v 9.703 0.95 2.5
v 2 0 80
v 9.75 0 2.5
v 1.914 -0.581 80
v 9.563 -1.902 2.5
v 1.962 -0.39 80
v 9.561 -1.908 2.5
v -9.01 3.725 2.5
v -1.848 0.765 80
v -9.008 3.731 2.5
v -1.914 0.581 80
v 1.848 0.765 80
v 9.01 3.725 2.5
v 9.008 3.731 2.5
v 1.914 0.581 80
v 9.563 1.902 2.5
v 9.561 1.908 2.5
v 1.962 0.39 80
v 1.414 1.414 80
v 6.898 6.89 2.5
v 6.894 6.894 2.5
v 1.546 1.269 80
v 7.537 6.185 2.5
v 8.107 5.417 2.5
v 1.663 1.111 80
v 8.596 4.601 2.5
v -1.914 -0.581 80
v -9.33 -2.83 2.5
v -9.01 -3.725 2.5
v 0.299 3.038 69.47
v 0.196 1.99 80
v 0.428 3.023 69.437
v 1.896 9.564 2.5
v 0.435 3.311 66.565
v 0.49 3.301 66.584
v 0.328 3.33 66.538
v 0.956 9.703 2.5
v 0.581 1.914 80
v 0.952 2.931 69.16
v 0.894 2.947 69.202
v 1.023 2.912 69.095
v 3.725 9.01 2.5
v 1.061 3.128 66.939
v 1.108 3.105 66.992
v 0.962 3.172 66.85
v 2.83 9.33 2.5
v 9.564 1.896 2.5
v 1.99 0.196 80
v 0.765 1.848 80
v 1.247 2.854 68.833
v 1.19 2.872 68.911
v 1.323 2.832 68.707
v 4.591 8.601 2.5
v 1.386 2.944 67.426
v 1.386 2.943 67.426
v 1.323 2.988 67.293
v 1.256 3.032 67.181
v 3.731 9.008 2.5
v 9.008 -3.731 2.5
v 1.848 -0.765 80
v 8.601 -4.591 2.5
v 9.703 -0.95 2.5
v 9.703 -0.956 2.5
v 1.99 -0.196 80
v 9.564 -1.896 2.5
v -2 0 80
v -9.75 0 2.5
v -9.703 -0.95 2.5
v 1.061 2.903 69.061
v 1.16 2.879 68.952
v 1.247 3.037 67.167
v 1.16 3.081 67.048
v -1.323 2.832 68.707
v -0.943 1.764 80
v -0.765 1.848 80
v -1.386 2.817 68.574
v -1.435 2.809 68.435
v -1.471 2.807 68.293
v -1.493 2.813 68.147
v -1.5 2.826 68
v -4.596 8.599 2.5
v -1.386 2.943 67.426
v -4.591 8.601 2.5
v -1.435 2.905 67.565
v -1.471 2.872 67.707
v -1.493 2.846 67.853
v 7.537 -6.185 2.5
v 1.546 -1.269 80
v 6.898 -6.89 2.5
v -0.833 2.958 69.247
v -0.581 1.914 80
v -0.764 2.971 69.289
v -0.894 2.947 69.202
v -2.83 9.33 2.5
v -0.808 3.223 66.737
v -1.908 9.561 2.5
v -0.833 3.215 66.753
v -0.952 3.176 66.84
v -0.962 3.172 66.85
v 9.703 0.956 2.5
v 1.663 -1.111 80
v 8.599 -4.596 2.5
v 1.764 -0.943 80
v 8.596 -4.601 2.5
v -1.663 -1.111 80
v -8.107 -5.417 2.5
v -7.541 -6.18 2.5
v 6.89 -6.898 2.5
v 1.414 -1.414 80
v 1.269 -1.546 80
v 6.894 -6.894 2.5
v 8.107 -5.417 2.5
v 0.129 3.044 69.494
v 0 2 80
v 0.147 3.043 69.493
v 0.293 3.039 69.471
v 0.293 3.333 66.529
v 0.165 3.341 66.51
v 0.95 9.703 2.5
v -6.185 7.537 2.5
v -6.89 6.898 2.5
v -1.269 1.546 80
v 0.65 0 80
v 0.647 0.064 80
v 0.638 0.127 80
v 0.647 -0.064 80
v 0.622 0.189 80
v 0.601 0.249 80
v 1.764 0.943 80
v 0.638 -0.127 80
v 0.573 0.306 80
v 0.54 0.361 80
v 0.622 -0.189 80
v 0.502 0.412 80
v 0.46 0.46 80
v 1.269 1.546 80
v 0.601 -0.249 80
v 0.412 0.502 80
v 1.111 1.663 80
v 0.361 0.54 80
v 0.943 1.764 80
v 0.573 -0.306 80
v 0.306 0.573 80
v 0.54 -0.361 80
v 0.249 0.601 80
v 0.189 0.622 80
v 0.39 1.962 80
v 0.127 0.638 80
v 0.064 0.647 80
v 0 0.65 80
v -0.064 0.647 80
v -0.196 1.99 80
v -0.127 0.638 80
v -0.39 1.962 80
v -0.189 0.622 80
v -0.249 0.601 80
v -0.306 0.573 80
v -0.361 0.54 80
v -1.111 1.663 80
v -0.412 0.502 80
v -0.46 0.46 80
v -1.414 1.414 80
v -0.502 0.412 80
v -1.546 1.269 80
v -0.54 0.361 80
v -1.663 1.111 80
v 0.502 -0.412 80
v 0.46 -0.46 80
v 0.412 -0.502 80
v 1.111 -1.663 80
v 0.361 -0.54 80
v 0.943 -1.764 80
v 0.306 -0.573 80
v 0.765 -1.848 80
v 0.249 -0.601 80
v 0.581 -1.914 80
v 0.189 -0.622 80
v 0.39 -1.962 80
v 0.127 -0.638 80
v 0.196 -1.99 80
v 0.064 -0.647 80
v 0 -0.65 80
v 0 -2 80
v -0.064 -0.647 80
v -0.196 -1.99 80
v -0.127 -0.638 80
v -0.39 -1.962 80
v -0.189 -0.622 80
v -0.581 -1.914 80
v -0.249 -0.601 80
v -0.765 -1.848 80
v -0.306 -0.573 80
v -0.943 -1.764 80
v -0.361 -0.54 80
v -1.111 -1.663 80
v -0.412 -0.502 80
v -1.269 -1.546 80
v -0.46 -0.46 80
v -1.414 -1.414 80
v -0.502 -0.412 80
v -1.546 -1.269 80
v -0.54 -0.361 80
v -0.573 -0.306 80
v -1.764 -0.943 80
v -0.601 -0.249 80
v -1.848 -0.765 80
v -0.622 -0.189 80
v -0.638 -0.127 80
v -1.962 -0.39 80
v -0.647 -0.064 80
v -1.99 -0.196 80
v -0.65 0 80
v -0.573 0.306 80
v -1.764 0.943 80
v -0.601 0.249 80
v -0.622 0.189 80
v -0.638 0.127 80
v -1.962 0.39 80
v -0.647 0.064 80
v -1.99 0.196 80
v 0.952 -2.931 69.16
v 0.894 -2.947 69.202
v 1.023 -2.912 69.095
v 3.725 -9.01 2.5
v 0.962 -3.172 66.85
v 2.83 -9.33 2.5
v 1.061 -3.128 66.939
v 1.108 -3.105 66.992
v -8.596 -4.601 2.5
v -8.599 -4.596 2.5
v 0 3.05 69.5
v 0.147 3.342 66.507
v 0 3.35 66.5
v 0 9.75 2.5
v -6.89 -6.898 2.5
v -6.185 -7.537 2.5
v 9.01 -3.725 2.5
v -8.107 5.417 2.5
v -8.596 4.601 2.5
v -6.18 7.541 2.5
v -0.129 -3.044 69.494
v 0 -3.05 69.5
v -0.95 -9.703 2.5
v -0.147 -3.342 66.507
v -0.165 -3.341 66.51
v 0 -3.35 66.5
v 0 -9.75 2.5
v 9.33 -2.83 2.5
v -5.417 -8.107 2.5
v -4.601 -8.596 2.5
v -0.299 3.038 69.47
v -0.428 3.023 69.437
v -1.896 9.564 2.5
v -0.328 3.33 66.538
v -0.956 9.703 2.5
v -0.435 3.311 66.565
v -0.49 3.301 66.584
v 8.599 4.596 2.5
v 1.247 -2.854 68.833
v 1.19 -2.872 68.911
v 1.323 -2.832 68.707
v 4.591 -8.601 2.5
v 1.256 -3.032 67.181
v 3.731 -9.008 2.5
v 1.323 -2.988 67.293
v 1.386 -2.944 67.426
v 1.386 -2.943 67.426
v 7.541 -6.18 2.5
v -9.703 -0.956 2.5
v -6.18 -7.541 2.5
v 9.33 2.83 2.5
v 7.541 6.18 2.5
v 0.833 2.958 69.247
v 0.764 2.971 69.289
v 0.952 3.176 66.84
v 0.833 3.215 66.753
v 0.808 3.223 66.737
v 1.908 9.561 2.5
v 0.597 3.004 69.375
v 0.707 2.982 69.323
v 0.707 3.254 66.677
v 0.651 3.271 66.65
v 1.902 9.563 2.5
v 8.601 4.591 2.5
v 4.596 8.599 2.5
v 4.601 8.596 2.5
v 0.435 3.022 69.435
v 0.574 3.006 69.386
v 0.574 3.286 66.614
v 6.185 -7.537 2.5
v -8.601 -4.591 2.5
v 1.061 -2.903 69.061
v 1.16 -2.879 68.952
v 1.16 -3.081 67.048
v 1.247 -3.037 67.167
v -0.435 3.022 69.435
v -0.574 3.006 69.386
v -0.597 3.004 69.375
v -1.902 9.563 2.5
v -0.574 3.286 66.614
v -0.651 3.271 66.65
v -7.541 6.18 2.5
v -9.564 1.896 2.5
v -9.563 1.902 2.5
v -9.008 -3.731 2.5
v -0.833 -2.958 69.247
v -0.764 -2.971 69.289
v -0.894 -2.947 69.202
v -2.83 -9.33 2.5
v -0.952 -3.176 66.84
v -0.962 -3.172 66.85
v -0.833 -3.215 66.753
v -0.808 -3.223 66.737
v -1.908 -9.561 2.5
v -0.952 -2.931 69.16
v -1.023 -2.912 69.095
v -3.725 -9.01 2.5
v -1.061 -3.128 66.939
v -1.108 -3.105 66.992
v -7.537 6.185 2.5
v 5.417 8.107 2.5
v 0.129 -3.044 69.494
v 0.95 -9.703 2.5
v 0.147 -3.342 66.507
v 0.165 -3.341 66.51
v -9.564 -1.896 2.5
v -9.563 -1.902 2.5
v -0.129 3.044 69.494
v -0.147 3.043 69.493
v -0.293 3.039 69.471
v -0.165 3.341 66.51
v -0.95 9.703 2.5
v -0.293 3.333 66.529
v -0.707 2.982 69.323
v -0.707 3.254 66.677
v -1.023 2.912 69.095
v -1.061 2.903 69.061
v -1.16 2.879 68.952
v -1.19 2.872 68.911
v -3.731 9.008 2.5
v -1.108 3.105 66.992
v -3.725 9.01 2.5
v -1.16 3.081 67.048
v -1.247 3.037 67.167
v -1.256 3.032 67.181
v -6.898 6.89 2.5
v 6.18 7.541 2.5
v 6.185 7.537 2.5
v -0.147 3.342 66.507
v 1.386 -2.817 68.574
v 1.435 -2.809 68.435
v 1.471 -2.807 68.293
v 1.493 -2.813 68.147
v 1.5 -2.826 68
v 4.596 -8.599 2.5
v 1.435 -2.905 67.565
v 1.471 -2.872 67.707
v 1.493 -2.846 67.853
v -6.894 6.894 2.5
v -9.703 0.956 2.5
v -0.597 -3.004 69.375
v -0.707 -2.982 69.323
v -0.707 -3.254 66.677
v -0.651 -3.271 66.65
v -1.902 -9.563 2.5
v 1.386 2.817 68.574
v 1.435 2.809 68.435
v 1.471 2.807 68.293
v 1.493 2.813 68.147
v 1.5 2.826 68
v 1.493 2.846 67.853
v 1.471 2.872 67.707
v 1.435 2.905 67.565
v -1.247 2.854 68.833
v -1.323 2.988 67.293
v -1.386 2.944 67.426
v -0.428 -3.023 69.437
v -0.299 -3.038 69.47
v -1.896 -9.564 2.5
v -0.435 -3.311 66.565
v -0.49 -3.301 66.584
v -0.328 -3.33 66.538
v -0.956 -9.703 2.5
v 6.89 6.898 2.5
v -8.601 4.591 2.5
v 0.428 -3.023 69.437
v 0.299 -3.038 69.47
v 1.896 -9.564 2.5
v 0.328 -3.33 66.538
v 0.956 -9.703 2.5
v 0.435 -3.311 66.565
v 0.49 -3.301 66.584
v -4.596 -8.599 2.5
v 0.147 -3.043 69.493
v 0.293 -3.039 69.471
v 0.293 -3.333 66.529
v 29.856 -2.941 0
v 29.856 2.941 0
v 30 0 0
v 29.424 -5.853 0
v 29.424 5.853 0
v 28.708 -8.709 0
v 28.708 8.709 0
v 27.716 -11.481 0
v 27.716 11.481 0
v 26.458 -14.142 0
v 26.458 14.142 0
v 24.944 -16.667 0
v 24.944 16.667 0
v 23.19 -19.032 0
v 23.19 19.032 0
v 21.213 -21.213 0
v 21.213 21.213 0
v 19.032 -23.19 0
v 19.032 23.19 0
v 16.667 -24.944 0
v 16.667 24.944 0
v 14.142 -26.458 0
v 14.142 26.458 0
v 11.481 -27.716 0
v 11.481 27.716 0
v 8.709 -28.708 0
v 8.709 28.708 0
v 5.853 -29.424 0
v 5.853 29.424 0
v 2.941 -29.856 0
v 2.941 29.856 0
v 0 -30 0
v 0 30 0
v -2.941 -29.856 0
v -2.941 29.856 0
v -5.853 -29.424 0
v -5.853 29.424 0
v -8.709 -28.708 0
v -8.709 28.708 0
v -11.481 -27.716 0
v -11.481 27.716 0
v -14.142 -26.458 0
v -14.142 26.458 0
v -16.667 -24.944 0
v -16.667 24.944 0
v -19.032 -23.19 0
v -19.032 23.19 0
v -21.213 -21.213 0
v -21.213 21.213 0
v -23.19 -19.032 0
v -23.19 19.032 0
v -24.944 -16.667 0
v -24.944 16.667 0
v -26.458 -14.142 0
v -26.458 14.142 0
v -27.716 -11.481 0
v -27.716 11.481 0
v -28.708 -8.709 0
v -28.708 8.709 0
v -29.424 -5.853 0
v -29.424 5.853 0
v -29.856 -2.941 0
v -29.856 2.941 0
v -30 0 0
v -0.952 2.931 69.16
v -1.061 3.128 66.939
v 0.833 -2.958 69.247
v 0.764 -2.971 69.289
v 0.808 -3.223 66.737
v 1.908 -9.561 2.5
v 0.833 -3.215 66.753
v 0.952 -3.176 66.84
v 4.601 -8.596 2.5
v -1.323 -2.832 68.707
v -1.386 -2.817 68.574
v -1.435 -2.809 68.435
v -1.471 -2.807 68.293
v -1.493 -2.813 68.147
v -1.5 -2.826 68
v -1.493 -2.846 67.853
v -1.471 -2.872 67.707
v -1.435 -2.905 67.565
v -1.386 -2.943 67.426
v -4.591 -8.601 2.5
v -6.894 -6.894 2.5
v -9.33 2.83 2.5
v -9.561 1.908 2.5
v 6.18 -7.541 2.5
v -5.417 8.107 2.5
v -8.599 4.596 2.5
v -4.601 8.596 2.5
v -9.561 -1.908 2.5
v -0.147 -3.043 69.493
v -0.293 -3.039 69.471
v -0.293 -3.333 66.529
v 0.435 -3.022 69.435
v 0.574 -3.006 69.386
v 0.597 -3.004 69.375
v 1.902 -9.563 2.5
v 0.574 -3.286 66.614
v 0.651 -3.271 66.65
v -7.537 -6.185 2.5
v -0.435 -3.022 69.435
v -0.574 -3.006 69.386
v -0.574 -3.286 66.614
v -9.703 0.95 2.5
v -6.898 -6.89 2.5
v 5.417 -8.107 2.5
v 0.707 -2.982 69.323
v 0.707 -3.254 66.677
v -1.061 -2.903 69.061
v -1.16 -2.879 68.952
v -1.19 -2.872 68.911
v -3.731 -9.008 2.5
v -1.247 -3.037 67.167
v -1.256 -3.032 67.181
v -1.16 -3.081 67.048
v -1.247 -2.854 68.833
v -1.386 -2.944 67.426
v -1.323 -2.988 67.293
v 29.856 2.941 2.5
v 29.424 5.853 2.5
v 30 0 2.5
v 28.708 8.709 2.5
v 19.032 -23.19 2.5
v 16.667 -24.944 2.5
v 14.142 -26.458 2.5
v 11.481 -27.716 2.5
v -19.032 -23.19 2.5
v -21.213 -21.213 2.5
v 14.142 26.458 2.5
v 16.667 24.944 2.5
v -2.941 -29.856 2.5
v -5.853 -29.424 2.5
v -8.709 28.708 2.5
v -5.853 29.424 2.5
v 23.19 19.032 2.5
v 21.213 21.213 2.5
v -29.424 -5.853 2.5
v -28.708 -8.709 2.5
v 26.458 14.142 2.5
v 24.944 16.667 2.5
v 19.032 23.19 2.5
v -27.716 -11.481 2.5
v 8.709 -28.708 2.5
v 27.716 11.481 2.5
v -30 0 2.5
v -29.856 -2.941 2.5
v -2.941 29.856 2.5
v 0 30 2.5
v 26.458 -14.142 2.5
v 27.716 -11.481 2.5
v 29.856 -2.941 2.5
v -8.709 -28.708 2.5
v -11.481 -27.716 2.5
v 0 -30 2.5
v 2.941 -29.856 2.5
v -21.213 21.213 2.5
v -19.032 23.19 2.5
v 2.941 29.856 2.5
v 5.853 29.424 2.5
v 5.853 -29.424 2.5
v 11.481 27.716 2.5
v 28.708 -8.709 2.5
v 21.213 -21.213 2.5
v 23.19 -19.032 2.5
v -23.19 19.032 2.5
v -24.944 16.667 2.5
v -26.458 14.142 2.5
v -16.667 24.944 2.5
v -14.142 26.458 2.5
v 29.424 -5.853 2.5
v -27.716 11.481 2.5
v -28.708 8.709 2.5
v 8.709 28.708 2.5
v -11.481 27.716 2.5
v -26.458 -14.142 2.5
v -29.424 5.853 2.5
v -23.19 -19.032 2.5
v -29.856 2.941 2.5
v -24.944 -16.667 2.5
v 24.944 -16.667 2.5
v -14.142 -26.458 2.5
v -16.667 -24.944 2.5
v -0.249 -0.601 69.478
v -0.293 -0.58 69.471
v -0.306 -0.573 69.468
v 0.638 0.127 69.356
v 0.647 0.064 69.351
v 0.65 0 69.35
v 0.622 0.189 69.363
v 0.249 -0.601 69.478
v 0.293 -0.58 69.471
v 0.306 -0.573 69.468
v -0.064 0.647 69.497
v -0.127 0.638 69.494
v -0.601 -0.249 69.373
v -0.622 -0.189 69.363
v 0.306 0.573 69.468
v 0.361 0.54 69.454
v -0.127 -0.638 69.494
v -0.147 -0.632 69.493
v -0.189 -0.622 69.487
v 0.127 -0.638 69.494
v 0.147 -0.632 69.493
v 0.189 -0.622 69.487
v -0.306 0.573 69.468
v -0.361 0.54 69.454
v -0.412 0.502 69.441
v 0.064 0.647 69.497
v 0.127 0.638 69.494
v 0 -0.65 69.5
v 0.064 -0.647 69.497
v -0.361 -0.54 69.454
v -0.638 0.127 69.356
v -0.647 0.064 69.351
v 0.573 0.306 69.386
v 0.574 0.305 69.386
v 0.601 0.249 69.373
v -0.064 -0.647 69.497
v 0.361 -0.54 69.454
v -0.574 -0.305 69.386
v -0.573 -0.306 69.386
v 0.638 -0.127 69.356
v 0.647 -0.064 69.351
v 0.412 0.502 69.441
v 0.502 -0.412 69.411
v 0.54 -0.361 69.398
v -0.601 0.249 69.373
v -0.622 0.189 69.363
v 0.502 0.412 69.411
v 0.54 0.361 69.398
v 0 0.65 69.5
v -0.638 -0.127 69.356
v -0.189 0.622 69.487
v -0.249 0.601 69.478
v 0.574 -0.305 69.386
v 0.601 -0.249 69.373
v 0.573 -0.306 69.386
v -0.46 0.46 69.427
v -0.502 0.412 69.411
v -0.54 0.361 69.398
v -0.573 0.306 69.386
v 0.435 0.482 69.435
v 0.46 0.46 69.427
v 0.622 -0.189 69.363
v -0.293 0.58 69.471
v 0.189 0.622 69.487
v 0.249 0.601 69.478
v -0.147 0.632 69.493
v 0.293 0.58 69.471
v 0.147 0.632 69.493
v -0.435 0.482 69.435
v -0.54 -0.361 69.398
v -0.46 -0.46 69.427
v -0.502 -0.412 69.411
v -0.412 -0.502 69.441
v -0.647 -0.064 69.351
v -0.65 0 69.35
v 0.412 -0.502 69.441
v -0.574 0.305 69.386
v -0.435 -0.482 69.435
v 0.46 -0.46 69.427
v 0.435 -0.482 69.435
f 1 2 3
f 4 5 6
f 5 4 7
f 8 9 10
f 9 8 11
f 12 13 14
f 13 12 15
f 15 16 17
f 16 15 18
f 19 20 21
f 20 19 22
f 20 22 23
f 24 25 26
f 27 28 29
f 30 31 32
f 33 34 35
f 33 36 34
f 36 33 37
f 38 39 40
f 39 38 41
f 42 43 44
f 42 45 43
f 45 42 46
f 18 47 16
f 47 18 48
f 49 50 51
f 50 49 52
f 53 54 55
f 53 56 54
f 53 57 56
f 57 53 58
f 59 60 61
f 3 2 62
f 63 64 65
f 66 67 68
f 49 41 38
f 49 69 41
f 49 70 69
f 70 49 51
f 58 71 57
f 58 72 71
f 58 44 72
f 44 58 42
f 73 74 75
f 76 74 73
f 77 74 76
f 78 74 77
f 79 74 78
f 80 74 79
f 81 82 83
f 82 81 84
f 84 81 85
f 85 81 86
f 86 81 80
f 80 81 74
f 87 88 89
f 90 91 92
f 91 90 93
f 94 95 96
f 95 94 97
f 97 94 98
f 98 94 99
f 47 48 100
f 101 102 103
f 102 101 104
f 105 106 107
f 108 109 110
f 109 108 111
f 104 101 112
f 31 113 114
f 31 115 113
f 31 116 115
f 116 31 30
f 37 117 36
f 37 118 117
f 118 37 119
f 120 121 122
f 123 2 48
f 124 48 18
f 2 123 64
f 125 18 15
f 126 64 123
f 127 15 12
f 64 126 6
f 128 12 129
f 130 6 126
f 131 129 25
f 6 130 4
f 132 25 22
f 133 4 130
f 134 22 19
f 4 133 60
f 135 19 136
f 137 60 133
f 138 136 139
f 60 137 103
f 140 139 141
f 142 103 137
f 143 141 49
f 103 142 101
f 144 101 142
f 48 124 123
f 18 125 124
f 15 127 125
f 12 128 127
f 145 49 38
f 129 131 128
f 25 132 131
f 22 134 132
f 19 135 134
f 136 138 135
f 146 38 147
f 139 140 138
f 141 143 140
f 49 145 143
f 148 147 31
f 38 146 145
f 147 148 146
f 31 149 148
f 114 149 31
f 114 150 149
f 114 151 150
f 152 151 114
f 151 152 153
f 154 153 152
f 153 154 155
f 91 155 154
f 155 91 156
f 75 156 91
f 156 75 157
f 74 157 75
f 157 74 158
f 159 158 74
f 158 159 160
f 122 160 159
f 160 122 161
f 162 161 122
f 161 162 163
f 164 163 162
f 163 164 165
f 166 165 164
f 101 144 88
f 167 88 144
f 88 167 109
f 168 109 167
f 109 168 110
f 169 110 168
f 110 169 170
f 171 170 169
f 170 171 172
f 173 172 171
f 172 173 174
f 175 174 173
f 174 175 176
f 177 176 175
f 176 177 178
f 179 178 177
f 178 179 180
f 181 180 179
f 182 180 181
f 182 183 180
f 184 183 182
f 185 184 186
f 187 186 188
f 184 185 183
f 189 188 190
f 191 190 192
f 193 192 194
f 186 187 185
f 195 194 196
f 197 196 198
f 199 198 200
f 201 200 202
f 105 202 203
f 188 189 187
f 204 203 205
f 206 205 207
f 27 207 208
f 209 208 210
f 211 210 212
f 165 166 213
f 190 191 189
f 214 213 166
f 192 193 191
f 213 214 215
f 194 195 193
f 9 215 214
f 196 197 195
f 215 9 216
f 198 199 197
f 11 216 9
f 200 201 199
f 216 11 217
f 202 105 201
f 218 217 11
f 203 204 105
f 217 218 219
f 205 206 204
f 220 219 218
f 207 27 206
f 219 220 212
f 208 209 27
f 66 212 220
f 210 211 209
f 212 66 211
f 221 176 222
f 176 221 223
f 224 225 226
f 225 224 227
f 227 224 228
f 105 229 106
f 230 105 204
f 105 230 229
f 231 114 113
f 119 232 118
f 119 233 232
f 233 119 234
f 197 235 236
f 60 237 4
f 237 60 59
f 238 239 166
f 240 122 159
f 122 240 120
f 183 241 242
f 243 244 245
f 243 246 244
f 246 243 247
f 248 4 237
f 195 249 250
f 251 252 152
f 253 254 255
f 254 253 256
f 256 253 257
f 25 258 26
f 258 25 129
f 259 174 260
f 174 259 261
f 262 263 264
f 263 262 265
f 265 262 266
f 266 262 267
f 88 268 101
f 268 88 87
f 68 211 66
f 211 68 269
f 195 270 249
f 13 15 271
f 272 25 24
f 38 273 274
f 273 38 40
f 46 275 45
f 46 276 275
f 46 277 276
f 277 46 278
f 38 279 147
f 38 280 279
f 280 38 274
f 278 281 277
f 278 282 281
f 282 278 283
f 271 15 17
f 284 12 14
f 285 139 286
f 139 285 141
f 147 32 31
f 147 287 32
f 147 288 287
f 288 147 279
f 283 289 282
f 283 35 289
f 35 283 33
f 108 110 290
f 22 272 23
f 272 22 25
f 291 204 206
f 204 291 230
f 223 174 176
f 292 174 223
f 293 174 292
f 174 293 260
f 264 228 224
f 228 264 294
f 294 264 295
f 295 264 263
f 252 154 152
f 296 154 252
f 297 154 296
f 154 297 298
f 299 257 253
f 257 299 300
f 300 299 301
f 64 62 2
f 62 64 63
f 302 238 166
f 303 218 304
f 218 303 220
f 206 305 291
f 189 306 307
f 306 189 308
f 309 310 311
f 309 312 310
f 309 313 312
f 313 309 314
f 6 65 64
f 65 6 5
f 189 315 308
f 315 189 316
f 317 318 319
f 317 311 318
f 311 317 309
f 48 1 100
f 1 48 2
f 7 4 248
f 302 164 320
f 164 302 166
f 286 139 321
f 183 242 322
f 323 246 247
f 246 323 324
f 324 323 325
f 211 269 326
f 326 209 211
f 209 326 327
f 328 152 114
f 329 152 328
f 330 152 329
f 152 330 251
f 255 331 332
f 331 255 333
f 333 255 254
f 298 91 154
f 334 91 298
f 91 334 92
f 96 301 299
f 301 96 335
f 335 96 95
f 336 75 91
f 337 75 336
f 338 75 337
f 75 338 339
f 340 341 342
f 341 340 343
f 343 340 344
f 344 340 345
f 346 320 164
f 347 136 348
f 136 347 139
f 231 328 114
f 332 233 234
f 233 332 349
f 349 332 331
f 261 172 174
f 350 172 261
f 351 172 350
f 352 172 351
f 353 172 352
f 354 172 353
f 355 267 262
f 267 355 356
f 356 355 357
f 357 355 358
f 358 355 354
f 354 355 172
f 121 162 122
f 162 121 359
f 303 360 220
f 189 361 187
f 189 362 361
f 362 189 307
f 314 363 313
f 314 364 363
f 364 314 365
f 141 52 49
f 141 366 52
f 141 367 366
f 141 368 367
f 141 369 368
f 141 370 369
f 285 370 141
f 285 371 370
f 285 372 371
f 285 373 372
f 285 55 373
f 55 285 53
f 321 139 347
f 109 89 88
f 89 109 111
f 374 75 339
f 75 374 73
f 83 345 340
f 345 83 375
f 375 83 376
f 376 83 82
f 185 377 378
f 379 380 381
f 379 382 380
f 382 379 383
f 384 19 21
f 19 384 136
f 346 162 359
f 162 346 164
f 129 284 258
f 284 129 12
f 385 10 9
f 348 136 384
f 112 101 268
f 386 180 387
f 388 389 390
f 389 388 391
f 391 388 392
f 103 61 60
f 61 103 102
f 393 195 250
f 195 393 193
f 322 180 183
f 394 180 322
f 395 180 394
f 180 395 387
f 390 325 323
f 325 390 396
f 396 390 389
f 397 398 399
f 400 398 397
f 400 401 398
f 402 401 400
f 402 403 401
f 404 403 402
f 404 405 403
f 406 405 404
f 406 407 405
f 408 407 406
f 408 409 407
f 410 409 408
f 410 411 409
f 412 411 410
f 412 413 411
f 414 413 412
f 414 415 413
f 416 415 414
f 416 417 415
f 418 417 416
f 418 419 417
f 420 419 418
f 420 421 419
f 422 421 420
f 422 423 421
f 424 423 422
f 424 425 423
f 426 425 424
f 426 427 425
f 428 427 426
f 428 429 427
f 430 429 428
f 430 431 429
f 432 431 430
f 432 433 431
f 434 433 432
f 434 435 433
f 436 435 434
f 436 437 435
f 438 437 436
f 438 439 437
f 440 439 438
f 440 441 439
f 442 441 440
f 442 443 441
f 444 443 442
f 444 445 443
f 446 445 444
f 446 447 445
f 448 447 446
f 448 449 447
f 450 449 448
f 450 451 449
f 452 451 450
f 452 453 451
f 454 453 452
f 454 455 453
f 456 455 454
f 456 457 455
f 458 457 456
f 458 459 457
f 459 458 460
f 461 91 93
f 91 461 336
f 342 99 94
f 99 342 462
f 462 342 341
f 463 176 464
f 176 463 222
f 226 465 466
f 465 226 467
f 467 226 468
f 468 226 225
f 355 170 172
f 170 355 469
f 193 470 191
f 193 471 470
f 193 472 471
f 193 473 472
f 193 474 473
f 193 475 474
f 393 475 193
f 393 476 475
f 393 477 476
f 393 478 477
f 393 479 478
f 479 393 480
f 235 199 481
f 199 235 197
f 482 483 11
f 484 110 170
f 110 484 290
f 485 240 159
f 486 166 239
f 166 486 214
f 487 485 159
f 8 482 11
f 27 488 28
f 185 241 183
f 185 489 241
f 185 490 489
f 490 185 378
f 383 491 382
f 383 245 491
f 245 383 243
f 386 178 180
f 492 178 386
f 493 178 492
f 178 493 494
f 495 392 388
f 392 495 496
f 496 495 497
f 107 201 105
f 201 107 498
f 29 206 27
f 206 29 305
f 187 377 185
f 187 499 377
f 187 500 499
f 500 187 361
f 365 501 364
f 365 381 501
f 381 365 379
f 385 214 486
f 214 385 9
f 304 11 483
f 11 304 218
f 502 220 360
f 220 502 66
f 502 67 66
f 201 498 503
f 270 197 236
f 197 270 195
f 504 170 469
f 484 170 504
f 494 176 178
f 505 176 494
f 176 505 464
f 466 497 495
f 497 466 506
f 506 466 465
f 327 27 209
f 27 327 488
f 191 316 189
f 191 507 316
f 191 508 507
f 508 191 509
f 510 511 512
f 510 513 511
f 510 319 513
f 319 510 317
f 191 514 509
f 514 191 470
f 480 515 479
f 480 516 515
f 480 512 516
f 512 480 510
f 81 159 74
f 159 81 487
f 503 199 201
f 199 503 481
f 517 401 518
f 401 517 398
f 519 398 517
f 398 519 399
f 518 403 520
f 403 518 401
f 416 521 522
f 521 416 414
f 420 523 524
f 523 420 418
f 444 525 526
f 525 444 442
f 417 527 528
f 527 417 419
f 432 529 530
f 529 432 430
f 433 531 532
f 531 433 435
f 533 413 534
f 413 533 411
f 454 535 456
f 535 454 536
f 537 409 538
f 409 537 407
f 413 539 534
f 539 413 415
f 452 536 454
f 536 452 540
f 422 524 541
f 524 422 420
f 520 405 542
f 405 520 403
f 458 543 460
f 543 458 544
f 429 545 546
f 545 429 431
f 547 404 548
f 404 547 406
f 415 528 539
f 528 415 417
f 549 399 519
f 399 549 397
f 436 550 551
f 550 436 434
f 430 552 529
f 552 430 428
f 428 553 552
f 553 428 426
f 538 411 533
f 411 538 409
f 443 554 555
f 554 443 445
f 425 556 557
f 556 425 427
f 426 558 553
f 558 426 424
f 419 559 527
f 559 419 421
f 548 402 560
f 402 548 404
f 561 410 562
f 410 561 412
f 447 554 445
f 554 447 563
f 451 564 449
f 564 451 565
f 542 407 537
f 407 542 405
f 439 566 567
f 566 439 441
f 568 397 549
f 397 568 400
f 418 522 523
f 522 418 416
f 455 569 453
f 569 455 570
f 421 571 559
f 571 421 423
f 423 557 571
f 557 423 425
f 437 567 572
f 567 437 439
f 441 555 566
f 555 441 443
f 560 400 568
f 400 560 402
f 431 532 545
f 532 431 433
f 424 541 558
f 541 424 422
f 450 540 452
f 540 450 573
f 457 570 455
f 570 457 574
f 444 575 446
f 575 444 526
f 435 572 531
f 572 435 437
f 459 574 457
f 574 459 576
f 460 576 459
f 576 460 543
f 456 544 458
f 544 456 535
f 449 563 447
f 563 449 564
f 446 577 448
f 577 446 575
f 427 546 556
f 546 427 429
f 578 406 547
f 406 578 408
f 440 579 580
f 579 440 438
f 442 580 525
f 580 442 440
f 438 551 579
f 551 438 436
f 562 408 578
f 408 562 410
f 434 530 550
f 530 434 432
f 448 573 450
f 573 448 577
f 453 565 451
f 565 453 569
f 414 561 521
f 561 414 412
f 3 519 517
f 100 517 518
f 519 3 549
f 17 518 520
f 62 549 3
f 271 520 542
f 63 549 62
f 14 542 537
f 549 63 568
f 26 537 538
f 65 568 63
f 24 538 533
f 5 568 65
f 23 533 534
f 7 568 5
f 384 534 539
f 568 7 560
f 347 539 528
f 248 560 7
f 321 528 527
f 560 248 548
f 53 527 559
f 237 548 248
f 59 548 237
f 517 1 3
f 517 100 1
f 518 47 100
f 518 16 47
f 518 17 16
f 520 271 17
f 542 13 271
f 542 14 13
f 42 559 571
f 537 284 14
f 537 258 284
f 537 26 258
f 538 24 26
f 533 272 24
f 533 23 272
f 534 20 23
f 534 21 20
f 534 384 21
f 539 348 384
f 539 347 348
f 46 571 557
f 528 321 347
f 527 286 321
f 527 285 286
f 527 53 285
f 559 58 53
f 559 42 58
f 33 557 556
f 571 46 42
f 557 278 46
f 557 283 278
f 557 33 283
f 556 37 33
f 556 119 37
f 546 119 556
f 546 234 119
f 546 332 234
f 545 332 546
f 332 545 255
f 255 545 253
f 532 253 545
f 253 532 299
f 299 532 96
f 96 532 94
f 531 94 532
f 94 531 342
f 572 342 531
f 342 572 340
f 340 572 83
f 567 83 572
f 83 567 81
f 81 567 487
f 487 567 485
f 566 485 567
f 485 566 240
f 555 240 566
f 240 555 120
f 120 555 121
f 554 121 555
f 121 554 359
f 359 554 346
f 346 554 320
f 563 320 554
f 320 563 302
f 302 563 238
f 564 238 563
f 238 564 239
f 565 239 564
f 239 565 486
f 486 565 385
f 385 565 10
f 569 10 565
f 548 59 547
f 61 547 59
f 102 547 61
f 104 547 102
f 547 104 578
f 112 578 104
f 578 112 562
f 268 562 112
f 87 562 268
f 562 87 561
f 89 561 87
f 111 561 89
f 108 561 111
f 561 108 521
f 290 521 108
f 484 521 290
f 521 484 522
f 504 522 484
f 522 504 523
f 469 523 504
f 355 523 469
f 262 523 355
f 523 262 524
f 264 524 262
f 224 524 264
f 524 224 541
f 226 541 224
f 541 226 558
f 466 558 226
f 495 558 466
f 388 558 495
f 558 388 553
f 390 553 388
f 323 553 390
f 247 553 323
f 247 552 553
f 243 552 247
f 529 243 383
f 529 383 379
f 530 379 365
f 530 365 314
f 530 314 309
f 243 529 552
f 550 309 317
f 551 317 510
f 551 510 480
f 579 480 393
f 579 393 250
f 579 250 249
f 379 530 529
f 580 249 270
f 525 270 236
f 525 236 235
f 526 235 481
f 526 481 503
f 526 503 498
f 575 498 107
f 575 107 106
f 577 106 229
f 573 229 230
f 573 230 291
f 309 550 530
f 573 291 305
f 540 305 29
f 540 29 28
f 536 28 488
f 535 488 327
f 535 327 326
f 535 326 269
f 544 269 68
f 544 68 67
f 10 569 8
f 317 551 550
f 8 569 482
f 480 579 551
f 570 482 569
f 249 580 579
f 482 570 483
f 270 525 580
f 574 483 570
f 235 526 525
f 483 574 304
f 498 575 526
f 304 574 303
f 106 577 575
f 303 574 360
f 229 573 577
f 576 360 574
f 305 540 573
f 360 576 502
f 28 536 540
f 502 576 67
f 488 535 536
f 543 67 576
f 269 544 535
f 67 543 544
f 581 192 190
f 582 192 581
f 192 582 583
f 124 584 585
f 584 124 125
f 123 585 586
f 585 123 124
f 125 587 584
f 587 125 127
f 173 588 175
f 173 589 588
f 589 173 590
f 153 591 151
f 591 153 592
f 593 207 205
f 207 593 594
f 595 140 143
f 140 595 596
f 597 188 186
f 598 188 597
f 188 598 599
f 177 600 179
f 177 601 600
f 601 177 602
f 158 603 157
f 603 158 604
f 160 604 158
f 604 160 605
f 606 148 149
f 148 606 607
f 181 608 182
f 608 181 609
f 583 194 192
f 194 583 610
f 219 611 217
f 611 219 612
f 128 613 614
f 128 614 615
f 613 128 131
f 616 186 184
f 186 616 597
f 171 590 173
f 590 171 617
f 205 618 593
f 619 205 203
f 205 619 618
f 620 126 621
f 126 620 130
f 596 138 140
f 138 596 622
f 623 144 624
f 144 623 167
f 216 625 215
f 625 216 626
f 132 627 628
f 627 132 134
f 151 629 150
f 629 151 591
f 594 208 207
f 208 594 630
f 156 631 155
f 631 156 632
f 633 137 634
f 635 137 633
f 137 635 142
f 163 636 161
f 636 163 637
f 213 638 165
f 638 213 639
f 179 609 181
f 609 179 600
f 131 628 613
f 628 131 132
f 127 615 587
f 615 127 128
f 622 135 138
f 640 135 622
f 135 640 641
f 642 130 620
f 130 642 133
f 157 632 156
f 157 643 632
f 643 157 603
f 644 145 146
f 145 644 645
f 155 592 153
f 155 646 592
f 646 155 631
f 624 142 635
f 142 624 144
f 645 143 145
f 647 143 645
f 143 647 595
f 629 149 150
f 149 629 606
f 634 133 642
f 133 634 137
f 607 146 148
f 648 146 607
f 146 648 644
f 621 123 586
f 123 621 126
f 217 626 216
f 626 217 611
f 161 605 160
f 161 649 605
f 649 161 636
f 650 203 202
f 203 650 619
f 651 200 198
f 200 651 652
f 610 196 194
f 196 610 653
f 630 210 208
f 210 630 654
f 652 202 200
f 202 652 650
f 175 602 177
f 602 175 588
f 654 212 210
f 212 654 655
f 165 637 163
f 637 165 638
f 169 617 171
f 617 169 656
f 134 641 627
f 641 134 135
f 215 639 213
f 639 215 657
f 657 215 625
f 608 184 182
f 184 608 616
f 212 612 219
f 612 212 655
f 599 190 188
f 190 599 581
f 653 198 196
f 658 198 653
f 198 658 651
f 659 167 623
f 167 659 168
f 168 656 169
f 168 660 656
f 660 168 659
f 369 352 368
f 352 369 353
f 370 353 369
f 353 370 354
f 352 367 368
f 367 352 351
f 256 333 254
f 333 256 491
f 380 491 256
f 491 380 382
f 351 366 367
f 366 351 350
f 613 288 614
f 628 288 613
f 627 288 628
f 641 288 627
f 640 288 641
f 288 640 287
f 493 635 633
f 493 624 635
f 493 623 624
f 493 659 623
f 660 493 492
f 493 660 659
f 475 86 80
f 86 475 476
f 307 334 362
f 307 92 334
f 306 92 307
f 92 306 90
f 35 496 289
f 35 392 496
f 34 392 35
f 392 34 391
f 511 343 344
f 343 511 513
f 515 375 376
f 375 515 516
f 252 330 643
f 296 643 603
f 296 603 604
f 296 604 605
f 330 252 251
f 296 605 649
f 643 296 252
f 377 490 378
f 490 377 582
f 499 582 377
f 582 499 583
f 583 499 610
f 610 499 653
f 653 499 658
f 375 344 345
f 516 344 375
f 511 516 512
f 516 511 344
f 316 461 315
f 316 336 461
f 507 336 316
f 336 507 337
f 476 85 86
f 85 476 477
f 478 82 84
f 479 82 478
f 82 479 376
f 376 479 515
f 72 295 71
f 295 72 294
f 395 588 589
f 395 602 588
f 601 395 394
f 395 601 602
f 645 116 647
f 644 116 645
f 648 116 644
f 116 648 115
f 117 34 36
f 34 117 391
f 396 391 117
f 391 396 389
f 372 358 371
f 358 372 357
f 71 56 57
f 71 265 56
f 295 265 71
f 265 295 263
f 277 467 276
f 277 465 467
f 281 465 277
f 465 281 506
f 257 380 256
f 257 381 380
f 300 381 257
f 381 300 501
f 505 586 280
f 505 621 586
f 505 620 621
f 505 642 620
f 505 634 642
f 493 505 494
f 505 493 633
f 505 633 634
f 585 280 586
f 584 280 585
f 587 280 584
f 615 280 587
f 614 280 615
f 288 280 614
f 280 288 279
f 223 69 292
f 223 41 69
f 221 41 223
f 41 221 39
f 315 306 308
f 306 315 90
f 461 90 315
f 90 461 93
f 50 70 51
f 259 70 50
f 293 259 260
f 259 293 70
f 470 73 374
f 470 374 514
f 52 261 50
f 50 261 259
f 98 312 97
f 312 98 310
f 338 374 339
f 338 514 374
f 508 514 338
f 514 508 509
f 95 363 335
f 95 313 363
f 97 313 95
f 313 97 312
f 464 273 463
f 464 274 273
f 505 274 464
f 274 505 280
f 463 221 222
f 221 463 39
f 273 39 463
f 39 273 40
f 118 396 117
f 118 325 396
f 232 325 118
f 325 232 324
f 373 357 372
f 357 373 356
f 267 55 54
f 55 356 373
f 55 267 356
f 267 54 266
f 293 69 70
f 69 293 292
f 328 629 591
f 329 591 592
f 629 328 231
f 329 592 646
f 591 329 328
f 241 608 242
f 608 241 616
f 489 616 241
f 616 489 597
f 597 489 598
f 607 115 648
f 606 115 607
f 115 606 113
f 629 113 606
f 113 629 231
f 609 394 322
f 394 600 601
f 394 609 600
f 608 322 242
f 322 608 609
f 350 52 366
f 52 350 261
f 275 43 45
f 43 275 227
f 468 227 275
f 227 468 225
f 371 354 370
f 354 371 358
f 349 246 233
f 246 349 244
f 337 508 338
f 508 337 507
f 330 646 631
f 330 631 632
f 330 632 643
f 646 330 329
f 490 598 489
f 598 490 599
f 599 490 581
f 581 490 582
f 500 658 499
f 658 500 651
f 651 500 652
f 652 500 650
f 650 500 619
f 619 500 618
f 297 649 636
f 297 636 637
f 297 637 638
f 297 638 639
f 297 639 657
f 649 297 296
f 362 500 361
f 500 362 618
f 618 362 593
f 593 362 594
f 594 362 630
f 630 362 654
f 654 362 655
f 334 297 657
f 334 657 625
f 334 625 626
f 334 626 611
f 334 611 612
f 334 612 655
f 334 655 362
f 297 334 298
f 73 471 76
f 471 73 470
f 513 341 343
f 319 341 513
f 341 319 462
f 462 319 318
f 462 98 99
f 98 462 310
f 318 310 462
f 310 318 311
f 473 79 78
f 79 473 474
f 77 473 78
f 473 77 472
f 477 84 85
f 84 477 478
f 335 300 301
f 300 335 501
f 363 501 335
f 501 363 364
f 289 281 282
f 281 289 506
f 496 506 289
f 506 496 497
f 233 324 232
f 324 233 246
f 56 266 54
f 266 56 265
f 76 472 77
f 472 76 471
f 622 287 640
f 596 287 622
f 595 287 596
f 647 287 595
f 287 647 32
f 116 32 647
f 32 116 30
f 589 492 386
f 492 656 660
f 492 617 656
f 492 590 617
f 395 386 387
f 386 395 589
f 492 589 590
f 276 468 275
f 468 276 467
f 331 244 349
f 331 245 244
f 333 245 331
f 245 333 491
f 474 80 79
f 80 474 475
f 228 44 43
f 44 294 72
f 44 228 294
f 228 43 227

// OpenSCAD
module render()
{
  spindle_height = 80;
  spindle_bottom_radius = 10;
  spindle_top_radius = 2;
  base_height = 2.5;
  base_radius = 30;
  pinhole_depth = 12;
  pinhole_radius = 0.65;
  nailhole_length = 10;
  nailhole_radius= 1.5;

  difference() {
    union() {
      cylinder(h = spindle_height,
               r1 = spindle_bottom_radius,
               r2 = spindle_top_radius, $fn=64);
      cylinder(h = base_height,
               r1 = base_radius,
               r2 = base_radius, $fn=64);
    }
    translate([0, 0, spindle_height-pinhole_depth])
    cylinder(h = pinhole_depth,
             r1 = pinhole_radius,
             r2 = pinhole_radius, $fn=64);
    translate([0, 0, spindle_height-pinhole_depth])
    rotate([90, 0, 0])
    cylinder(h = nailhole_length,
            r1 = nailhole_radius,
            r2 = nailhole_radius, $fn=64, center=true);
  }

}

echo(version=version());

render();
